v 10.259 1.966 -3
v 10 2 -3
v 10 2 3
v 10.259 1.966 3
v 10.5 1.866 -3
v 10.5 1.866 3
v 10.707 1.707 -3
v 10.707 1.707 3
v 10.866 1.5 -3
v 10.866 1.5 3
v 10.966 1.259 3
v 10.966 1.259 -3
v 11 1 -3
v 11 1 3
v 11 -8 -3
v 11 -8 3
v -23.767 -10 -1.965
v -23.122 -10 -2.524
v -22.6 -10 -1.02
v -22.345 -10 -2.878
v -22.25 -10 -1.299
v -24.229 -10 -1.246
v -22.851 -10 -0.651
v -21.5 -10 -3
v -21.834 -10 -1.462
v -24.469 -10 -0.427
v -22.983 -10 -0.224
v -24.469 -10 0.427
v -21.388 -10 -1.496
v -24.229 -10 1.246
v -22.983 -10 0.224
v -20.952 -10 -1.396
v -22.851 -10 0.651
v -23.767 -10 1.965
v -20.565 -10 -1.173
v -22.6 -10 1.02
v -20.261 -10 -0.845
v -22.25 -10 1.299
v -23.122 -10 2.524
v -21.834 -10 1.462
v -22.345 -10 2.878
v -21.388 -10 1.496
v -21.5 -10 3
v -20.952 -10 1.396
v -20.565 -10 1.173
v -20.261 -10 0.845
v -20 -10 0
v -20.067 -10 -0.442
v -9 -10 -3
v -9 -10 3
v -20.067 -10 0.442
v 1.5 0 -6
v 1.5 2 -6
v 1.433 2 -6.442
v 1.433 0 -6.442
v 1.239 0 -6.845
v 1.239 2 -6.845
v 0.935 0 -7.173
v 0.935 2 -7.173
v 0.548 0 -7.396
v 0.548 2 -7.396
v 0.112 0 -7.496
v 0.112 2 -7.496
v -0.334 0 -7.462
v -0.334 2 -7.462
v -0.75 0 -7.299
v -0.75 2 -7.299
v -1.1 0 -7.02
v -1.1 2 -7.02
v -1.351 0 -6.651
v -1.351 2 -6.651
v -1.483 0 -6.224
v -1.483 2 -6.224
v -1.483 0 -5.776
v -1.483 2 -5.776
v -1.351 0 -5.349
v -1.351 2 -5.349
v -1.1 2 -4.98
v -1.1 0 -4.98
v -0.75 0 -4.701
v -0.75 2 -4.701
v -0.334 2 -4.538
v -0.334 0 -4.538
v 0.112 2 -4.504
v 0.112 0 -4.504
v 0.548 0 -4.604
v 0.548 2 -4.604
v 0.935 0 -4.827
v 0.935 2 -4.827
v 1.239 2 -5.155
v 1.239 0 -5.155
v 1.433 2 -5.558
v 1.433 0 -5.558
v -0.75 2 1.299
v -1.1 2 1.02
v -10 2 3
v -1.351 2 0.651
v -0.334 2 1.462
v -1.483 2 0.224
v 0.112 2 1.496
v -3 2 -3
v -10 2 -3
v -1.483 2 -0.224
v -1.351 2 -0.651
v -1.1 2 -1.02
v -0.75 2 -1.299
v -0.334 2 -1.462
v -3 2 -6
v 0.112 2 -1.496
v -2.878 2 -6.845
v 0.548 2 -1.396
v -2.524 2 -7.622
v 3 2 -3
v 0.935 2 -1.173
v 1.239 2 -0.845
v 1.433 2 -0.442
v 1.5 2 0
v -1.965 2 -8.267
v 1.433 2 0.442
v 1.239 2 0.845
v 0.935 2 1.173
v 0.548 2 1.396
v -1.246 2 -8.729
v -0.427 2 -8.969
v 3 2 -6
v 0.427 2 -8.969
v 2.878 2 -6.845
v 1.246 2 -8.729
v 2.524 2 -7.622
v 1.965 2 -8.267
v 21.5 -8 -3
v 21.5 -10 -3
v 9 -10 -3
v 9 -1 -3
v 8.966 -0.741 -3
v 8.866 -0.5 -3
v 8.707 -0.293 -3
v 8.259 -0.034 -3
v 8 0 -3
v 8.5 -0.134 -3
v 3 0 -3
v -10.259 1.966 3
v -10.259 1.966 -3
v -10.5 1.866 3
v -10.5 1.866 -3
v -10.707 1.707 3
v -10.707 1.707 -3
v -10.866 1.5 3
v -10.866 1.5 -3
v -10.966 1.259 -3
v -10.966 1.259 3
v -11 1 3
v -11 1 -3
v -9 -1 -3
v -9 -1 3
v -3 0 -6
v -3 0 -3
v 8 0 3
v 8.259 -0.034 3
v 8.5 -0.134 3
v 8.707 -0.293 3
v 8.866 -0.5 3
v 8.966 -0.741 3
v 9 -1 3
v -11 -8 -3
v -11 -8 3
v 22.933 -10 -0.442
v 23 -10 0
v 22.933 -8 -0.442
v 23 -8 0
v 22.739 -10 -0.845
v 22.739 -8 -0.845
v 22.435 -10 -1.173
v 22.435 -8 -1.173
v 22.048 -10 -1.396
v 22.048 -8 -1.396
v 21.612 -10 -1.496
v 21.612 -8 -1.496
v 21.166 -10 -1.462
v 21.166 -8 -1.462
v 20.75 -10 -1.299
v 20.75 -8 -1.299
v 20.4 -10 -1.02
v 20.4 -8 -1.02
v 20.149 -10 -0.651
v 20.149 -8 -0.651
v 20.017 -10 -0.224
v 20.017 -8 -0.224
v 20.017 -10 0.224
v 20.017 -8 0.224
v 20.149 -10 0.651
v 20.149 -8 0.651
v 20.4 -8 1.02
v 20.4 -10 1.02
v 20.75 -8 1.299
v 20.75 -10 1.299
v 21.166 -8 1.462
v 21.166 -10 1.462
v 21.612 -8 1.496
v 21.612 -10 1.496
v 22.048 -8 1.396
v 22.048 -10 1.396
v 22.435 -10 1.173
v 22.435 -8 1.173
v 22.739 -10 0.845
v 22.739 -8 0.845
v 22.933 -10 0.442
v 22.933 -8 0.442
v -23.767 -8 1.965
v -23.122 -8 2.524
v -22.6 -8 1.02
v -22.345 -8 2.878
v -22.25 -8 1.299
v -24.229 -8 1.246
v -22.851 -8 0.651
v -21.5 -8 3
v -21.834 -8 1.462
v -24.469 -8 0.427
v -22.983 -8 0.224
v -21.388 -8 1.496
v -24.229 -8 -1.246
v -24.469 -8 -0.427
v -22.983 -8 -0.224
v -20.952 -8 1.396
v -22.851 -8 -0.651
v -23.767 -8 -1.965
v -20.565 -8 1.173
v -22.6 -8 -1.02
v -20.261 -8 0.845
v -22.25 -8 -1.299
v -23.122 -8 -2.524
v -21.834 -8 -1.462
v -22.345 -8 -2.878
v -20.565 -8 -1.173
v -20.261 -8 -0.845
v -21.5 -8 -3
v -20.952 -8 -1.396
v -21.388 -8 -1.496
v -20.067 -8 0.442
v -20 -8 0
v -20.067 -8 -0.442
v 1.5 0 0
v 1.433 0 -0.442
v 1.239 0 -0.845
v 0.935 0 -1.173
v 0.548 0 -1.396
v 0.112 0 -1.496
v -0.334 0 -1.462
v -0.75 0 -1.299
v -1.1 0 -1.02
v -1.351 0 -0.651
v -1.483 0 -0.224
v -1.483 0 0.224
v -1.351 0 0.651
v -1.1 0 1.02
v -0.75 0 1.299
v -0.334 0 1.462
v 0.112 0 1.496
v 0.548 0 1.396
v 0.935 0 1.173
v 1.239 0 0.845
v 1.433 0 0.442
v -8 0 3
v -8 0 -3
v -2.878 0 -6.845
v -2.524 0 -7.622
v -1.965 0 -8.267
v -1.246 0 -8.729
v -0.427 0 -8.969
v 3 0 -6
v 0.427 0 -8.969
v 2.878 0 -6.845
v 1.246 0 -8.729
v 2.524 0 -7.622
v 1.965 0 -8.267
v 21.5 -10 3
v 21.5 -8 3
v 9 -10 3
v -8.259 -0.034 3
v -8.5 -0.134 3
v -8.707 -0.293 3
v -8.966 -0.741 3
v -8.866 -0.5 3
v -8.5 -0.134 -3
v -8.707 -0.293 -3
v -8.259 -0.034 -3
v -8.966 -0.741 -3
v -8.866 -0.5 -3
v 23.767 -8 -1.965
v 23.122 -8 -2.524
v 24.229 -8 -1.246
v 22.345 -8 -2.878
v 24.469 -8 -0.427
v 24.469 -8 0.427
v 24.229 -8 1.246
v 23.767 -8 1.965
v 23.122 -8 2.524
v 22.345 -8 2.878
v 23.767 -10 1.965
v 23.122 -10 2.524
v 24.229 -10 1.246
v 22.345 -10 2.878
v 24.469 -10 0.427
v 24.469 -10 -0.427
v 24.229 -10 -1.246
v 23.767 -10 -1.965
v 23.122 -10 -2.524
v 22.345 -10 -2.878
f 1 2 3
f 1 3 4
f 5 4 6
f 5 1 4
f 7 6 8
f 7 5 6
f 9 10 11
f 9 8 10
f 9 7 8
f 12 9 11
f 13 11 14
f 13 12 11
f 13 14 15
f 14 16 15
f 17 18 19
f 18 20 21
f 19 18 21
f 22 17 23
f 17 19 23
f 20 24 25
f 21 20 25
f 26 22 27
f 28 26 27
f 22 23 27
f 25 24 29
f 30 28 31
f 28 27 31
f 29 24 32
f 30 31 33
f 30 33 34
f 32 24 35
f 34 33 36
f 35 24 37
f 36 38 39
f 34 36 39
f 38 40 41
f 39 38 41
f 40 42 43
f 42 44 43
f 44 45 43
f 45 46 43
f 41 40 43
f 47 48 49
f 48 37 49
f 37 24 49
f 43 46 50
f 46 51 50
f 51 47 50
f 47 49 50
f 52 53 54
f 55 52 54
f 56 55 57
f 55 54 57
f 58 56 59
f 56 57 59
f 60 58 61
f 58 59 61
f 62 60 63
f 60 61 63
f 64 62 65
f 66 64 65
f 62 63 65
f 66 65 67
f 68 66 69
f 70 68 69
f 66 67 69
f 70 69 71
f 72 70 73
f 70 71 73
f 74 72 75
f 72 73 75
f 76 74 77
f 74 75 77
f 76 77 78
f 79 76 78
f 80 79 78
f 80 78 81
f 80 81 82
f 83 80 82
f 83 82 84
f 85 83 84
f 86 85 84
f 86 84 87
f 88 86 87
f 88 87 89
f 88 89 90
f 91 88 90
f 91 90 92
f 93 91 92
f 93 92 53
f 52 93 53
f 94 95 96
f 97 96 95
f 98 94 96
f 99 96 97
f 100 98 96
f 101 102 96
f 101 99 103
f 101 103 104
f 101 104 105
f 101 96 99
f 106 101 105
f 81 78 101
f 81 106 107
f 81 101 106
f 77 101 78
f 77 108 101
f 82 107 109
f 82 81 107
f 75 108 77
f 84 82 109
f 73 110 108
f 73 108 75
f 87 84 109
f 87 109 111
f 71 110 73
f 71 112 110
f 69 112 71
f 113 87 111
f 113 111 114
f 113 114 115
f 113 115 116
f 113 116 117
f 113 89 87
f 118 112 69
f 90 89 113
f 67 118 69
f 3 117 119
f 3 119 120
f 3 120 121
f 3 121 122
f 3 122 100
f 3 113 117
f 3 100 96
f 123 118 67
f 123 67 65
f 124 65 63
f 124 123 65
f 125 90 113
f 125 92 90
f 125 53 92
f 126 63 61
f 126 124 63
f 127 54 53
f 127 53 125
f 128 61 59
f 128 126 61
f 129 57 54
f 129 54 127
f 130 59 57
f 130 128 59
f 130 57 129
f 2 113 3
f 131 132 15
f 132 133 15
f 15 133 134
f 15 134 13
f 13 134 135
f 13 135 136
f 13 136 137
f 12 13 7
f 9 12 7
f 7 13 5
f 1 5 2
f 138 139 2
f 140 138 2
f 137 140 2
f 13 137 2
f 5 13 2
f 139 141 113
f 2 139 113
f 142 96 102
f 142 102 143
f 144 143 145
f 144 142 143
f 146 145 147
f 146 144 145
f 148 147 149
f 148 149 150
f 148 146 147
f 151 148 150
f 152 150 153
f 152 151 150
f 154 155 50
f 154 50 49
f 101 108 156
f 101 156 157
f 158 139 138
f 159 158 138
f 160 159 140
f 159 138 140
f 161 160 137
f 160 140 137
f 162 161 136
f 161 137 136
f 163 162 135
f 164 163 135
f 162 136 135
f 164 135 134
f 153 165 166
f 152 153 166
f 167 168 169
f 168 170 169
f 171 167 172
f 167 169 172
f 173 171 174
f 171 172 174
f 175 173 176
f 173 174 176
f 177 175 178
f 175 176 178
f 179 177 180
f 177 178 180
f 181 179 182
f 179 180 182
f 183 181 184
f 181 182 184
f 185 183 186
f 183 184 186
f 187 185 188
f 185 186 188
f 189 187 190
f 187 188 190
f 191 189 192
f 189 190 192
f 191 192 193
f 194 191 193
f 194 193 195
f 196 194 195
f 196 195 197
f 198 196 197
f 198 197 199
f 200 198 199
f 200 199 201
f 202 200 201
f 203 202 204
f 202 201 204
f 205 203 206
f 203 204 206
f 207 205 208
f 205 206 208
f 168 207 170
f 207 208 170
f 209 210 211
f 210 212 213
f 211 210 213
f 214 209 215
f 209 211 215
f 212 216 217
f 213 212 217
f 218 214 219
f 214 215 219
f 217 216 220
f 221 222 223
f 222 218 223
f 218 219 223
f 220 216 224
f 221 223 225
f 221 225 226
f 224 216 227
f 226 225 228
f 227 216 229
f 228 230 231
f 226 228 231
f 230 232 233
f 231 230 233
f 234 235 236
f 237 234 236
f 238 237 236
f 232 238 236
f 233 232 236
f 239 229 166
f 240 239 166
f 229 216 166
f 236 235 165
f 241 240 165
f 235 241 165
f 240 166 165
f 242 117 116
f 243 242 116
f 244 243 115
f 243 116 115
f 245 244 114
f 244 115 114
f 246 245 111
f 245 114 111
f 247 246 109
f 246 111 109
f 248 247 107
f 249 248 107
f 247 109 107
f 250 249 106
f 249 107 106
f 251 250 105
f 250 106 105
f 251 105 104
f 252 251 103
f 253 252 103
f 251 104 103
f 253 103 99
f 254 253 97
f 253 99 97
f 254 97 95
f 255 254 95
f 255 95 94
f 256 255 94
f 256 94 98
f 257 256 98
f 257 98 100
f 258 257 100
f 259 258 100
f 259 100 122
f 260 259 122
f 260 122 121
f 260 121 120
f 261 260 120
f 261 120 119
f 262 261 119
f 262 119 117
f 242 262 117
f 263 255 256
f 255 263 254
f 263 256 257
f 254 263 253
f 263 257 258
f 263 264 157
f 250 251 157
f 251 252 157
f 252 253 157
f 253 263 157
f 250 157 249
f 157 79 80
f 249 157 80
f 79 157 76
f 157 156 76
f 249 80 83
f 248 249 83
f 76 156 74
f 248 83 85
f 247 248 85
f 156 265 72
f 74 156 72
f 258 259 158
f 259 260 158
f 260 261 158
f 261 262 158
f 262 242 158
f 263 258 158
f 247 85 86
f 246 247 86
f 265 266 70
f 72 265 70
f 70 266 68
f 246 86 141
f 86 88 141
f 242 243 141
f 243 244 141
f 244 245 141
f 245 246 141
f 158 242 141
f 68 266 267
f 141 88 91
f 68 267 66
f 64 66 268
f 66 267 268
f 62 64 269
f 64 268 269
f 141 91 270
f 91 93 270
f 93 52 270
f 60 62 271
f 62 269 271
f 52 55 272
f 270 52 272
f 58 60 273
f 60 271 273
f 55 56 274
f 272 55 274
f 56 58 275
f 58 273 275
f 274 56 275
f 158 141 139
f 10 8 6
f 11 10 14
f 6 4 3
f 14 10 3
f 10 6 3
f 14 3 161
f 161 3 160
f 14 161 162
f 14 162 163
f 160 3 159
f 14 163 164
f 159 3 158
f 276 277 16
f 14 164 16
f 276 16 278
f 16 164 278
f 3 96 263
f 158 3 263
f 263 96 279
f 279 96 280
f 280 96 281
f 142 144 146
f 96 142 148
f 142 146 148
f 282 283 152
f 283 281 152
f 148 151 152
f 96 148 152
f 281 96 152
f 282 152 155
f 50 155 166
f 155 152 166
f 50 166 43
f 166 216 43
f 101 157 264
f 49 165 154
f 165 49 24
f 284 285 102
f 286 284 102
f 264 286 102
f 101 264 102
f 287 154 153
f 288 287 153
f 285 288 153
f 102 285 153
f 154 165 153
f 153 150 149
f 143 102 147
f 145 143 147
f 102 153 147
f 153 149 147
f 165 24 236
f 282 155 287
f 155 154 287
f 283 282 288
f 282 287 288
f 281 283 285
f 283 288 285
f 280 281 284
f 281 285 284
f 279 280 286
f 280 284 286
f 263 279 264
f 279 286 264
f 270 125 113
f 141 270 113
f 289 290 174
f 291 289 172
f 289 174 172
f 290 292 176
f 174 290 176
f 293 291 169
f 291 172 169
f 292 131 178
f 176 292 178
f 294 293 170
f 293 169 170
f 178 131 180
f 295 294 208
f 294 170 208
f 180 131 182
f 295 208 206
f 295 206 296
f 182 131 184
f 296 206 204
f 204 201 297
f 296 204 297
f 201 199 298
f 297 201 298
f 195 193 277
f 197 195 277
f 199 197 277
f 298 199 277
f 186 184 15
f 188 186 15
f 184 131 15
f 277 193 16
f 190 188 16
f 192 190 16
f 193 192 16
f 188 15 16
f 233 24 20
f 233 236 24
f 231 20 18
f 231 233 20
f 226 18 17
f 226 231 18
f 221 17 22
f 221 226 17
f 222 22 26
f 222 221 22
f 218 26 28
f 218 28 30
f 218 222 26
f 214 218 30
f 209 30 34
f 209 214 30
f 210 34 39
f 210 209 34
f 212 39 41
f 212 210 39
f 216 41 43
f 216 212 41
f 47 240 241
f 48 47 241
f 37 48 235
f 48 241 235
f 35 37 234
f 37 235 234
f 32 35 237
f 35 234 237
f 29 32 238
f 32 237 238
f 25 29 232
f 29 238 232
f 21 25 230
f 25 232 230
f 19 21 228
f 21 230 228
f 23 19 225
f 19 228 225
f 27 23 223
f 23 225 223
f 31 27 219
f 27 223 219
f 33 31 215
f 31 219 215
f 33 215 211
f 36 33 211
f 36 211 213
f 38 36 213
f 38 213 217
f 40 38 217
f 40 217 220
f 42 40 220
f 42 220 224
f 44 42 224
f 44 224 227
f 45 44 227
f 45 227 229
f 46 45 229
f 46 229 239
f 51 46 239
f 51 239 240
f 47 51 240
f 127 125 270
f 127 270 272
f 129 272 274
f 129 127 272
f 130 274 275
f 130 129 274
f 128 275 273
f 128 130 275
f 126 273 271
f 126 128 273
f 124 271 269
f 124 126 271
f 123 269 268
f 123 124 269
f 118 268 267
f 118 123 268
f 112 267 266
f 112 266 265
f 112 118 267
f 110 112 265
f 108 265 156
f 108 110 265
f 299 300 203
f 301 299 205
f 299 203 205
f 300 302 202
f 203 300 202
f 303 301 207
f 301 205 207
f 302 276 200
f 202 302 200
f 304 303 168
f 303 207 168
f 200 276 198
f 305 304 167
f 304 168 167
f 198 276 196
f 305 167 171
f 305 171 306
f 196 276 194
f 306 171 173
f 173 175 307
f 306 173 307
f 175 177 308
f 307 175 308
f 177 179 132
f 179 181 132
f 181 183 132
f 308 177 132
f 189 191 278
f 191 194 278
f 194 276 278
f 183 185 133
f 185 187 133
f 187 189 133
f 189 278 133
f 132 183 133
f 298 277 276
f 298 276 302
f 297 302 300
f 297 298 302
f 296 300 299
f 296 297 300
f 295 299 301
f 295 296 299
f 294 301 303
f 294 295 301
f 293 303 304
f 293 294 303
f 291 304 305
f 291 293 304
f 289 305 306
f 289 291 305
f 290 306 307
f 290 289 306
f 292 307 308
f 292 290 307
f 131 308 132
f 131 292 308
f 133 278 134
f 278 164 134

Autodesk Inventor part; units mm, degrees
ref_plane "YZ Plane" through (0, 0, 0) normal (1, 0, 0) x (0, 1, 0)
ref_plane "XZ Plane" through (0, 0, 0) normal (0, 1, 0) x (-1, 0, 0)
ref_plane "XY Plane" through (0, 0, 0) normal (0, 0, 1) x (1, 0, 0)
sketch "Sketch1" plane through (0, 0, 0) normal (0, 1, 0) x (-1, 0, 0)
  line L0 (11, 3) -> (-11, 3)
  line L1 (-11, 3) -> (-11, -3)
  line L2 (-11, -3) -> (11, -3)
  line L3 (11, -3) -> (11, 3)
  line L4 (11, 3) -> (-11, -3) construction
  line L5 (-11, 3) -> (11, -3) construction
  point P0 (0, 0)
  dimension "d0" = 22
  dimension "d1" = 6
extrude "Extrusion1" add sketch "Sketch1" along normal blind 2
sketch "Sketch2" plane through (0, 0, 0) normal (0, -1, 0) x (1, 0, 0)
  line L0 (11, -3) -> (-11, -3) projected
  line L1 (-11, 3) -> (-9, 3)
  line L2 (-9, 3) -> (-9, -3)
  line L3 (-9, -3) -> (-11, -3)
  line L4 (-11, -3) -> (-11, 3)
  line L5 (11, 3) -> (9, 3)
  line L6 (9, 3) -> (9, -3)
  line L7 (9, -3) -> (11, -3)
  line L8 (11, -3) -> (11, 3)
  point P0 (0, 0)
  dimension "d4" = 2
  dimension "d5" = 2
extrude "Extrusion2" add sketch "Sketch2" along normal blind 10
sketch "Sketch3" plane through (11, 2, 3) normal (1, 0, 0) x (0, 0, -1)
  line L0 (0, -12) -> (6, -12)
  line L1 (6, -12) -> (6, -10)
  line L2 (6, -10) -> (0, -10)
  line L3 (0, -10) -> (0, -12)
  point P0 (3, -2)
  dimension "d8" = 6
  dimension "d9" = 2
sketch "Sketch4" plane through (-11, 2, -3) normal (-1, 0, 0) x (0, 0, 1)
  line L0 (0, -12) -> (6, -12)
  line L1 (6, -12) -> (6, -10)
  line L2 (6, -10) -> (0, -10)
  line L3 (0, -10) -> (0, -12)
  point P0 (3, -2)
  dimension "d10" = 6
  dimension "d11" = 2
extrude "Extrusion3" add sketch "Sketch4" along normal blind 14
extrude "Extrusion4" add sketch "Sketch3" along normal blind 14
sketch "Sketch5" plane through (11, -8, 3) normal (0, 1, 0) x (1, 0, 0)
  line L0 (0, 0) -> (14, 0) projected
  line L1 (14, 6) -> (14, 0) projected
  line L2 (0, 6) -> (14, 6) projected
  line L3 (14, 3) -> (10.5, 3)
  circle A0 centre (10.5, 3) radius 3.5
  line L4 (12.3028, 6) -> (14, 6)
  line L5 (14, 3) -> (14, 6)
  line L6 (14, 3) -> (14, 0)
  line L7 (14, 0) -> (12.3028, 0)
  point P0 (-11, 3)
  dimension "d16" = 3.5
sketch "Sketch6" plane through (-11, -8, 3) normal (0, 1, 0) x (1, 0, 0)
  line L0 (0, 6) -> (0, 0) projected
  line L1 (0, 6) -> (-14, 6) projected
  line L2 (-14, 0) -> (-14, 6) projected
  line L3 (0, 0) -> (-14, 0) projected
  line L4 (-14, 3) -> (-10.5, 3)
  circle A0 centre (-10.5, 3) radius 3.5
  line L5 (-12.3028, 0) -> (-14, 0)
  line L6 (-14, 0) -> (-14, 3)
  line L7 (-14, 6) -> (-14, 3)
  line L8 (-14, 6) -> (-12.3028, 6)
  point P0 (11, 3)
  point P1 (0, -0.5)
  dimension "d17" = 3.5
extrude "Extrusion5" cut sketch "Sketch5" against normal blind 2 contours A0 L1 L0 | A0 L2 L1
extrude "Extrusion6" cut sketch "Sketch6" against normal blind 2 contours A0 L2 L1 | L3 L2 A0
sketch "Sketch7" plane through (11, -8, 3) normal (0, 1, 0) x (1, 0, 0)
  arc A0 (12.3028, 0) -> (12.3028, 6) centre (10.5, 3) ccw projected
  circle A1 centre (10.5, 3) radius 1.5
  point P0 (-11, 3)
  dimension "d22" = 3
extrude "Extrusion7" cut sketch "Sketch7" against normal blind 2
sketch "Sketch8" plane through (-11, -8, 3) normal (0, 1, 0) x (1, 0, 0)
  arc A0 (-12.3028, 6) -> (-12.3028, 0) centre (-10.5, 3) ccw projected
  circle A1 centre (-10.5, 3) radius 1.5
  point P0 (11, 3)
  dimension "d25" = 3
extrude "Extrusion8" cut sketch "Sketch8" against normal blind 2
fillet "Fillet1" radius 1 4 edges at (11, 2, 0) (-11, 2, 0) (9, 0, 0) (-9, 0, 0)
sketch "Sketch9" plane through (0, 2, 0) normal (0, 1, 0) x (1, 0, 0)
  line L0 (-10, -3) -> (10, -3) projected
  line L1 (10, 3) -> (-10, 3) projected
  line L2 (0, -3) -> (0, 0)
  circle A0 centre (0, 0) radius 1.5
  point P0 (0, 0)
  dimension "d29" = 3
  dimension "d30" = 3
extrude "Extrusion9" cut sketch "Sketch9" against normal blind 2
sketch "Sketch10" plane through (0, 2, 0) normal (0, 1, 0) x (1, 0, 0)
  circle A0 centre (0, 0) radius 1.5 projected
  line L0 (10, 3) -> (-10, 3) projected
  line L1 (0, 0) -> (0, 6)
  circle A1 centre (0, 6) radius 1.5
  line L2 (0, 6) -> (0, 9)
  line L3 (-3.5, 5) -> (-3.5, 3)
  line L4 (3.5, 5) -> (3.5, 3)
  arc A2 (3.5, 5) -> (-3.5, 5) centre (0, 5) ccw
  line L5 (-3.5, 3) -> (3.5, 3)
  point P0 (0, 0)
  dimension "d33" = 6
  dimension "d34" = 3
  dimension "d35" = 3
extrude "Extrusion10" add sketch "Sketch10" against normal blind 2 contours L0 L3 A2 L2 A1 L1 | L1 A1 L2 A2 L4 L0
sketch "Sketch11" plane through (11, -8, 3) normal (0, 1, 0) x (1, 0, 0)
  arc A0 (12.3028, 0) -> (12.3028, 6) centre (10.5, 3) ccw projected
  line L0 (0, 6) -> (12.3028, 6) projected
  line L1 (0, 0) -> (12.3028, 0) projected
  circle A1 centre (10.5, 3) radius 3
  line L2 (10.5, 0) -> (12.3028, 0)
  line L3 (10.5, 6) -> (12.3028, 6)
  arc A2 (12.3028, 0) -> (12.3028, 6) centre (10.5, 3) ccw
  point P0 (-11, 3)
extrude "Extrusion11" cut sketch "Sketch11" against normal blind 2 contours L1 A1 L0 A0
sketch "Sketch12" plane through (-11, -8, 3) normal (0, 1, 0) x (1, 0, 0)
  arc A0 (-12.3028, 6) -> (-12.3028, 0) centre (-10.5, 3) ccw projected
  line L0 (0, 0) -> (-12.3028, 0) projected
  line L1 (0, 6) -> (-12.3028, 6) projected
  circle A1 centre (-10.5, 3) radius 3
  line L2 (-12.3028, 0) -> (-10.5, 0)
  line L3 (-12.3028, 6) -> (-10.5, 6)
  arc A2 (-12.3028, 6) -> (-12.3028, 0) centre (-10.5, 3) ccw
  point P0 (11, 3)
extrude "Extrusion12" cut sketch "Sketch12" against normal blind 2 contours L1 A1 L0 A0
sketch "Sketch13" plane through (0, 2, 0) normal (0, 1, 0) x (1, 0, 0)
  circle A0 centre (0, 6) radius 1.5 projected
  line L0 (3.5, 3) -> (3.5, 5) projected
  arc A1 (3.5, 5) -> (-3.5, 5) centre (0, 5) ccw projected
  line L1 (-3.5, 5) -> (-3.5, 3) projected
  line L2 (-3.5, 3) -> (-10, 3) projected
  circle A2 centre (0, 6) radius 1.5
  circle A3 centre (0, 6) radius 3
  line L3 (-3.5, 3) -> (3.5, 3)
  line L4 (3.5, 3) -> (3.5, 5)
  line L5 (-3.5, 3) -> (-3.5, 5)
  line L6 (-3, 6) -> (-3, 3)
  line L7 (3, 6) -> (3, 3)
  line L8 (-3, 3) -> (-3.5, 3)
  line L9 (3, 3) -> (3.5, 3)
  arc A4 (3.5, 5) -> (-3.5, 5) centre (0, 5) ccw
  dimension "d44" = 3
  dimension "d45" = 6
extrude "Extrusion13" cut sketch "Sketch13" against normal blind 2 contours L3 L7 A3 A1 L0 | A3 A1 | A3 L6 L3 L1 A1 picked at (-2.1113, 7.1747)
sketch "Sketch14" plane through (0, 2, 0) normal (0, 1, 0) x (1, 0, 0)
  arc A0 (-3, 6) -> (3, 6) centre (0, 6) ccw projected
  circle A1 centre (0, 6) radius 3
  circle A2 centre (0, 6) radius 1.5
  dimension "d48" = 3
extrude "Extrusion14" add sketch "Sketch14" against normal blind 2
properties part number "tahlo6"
